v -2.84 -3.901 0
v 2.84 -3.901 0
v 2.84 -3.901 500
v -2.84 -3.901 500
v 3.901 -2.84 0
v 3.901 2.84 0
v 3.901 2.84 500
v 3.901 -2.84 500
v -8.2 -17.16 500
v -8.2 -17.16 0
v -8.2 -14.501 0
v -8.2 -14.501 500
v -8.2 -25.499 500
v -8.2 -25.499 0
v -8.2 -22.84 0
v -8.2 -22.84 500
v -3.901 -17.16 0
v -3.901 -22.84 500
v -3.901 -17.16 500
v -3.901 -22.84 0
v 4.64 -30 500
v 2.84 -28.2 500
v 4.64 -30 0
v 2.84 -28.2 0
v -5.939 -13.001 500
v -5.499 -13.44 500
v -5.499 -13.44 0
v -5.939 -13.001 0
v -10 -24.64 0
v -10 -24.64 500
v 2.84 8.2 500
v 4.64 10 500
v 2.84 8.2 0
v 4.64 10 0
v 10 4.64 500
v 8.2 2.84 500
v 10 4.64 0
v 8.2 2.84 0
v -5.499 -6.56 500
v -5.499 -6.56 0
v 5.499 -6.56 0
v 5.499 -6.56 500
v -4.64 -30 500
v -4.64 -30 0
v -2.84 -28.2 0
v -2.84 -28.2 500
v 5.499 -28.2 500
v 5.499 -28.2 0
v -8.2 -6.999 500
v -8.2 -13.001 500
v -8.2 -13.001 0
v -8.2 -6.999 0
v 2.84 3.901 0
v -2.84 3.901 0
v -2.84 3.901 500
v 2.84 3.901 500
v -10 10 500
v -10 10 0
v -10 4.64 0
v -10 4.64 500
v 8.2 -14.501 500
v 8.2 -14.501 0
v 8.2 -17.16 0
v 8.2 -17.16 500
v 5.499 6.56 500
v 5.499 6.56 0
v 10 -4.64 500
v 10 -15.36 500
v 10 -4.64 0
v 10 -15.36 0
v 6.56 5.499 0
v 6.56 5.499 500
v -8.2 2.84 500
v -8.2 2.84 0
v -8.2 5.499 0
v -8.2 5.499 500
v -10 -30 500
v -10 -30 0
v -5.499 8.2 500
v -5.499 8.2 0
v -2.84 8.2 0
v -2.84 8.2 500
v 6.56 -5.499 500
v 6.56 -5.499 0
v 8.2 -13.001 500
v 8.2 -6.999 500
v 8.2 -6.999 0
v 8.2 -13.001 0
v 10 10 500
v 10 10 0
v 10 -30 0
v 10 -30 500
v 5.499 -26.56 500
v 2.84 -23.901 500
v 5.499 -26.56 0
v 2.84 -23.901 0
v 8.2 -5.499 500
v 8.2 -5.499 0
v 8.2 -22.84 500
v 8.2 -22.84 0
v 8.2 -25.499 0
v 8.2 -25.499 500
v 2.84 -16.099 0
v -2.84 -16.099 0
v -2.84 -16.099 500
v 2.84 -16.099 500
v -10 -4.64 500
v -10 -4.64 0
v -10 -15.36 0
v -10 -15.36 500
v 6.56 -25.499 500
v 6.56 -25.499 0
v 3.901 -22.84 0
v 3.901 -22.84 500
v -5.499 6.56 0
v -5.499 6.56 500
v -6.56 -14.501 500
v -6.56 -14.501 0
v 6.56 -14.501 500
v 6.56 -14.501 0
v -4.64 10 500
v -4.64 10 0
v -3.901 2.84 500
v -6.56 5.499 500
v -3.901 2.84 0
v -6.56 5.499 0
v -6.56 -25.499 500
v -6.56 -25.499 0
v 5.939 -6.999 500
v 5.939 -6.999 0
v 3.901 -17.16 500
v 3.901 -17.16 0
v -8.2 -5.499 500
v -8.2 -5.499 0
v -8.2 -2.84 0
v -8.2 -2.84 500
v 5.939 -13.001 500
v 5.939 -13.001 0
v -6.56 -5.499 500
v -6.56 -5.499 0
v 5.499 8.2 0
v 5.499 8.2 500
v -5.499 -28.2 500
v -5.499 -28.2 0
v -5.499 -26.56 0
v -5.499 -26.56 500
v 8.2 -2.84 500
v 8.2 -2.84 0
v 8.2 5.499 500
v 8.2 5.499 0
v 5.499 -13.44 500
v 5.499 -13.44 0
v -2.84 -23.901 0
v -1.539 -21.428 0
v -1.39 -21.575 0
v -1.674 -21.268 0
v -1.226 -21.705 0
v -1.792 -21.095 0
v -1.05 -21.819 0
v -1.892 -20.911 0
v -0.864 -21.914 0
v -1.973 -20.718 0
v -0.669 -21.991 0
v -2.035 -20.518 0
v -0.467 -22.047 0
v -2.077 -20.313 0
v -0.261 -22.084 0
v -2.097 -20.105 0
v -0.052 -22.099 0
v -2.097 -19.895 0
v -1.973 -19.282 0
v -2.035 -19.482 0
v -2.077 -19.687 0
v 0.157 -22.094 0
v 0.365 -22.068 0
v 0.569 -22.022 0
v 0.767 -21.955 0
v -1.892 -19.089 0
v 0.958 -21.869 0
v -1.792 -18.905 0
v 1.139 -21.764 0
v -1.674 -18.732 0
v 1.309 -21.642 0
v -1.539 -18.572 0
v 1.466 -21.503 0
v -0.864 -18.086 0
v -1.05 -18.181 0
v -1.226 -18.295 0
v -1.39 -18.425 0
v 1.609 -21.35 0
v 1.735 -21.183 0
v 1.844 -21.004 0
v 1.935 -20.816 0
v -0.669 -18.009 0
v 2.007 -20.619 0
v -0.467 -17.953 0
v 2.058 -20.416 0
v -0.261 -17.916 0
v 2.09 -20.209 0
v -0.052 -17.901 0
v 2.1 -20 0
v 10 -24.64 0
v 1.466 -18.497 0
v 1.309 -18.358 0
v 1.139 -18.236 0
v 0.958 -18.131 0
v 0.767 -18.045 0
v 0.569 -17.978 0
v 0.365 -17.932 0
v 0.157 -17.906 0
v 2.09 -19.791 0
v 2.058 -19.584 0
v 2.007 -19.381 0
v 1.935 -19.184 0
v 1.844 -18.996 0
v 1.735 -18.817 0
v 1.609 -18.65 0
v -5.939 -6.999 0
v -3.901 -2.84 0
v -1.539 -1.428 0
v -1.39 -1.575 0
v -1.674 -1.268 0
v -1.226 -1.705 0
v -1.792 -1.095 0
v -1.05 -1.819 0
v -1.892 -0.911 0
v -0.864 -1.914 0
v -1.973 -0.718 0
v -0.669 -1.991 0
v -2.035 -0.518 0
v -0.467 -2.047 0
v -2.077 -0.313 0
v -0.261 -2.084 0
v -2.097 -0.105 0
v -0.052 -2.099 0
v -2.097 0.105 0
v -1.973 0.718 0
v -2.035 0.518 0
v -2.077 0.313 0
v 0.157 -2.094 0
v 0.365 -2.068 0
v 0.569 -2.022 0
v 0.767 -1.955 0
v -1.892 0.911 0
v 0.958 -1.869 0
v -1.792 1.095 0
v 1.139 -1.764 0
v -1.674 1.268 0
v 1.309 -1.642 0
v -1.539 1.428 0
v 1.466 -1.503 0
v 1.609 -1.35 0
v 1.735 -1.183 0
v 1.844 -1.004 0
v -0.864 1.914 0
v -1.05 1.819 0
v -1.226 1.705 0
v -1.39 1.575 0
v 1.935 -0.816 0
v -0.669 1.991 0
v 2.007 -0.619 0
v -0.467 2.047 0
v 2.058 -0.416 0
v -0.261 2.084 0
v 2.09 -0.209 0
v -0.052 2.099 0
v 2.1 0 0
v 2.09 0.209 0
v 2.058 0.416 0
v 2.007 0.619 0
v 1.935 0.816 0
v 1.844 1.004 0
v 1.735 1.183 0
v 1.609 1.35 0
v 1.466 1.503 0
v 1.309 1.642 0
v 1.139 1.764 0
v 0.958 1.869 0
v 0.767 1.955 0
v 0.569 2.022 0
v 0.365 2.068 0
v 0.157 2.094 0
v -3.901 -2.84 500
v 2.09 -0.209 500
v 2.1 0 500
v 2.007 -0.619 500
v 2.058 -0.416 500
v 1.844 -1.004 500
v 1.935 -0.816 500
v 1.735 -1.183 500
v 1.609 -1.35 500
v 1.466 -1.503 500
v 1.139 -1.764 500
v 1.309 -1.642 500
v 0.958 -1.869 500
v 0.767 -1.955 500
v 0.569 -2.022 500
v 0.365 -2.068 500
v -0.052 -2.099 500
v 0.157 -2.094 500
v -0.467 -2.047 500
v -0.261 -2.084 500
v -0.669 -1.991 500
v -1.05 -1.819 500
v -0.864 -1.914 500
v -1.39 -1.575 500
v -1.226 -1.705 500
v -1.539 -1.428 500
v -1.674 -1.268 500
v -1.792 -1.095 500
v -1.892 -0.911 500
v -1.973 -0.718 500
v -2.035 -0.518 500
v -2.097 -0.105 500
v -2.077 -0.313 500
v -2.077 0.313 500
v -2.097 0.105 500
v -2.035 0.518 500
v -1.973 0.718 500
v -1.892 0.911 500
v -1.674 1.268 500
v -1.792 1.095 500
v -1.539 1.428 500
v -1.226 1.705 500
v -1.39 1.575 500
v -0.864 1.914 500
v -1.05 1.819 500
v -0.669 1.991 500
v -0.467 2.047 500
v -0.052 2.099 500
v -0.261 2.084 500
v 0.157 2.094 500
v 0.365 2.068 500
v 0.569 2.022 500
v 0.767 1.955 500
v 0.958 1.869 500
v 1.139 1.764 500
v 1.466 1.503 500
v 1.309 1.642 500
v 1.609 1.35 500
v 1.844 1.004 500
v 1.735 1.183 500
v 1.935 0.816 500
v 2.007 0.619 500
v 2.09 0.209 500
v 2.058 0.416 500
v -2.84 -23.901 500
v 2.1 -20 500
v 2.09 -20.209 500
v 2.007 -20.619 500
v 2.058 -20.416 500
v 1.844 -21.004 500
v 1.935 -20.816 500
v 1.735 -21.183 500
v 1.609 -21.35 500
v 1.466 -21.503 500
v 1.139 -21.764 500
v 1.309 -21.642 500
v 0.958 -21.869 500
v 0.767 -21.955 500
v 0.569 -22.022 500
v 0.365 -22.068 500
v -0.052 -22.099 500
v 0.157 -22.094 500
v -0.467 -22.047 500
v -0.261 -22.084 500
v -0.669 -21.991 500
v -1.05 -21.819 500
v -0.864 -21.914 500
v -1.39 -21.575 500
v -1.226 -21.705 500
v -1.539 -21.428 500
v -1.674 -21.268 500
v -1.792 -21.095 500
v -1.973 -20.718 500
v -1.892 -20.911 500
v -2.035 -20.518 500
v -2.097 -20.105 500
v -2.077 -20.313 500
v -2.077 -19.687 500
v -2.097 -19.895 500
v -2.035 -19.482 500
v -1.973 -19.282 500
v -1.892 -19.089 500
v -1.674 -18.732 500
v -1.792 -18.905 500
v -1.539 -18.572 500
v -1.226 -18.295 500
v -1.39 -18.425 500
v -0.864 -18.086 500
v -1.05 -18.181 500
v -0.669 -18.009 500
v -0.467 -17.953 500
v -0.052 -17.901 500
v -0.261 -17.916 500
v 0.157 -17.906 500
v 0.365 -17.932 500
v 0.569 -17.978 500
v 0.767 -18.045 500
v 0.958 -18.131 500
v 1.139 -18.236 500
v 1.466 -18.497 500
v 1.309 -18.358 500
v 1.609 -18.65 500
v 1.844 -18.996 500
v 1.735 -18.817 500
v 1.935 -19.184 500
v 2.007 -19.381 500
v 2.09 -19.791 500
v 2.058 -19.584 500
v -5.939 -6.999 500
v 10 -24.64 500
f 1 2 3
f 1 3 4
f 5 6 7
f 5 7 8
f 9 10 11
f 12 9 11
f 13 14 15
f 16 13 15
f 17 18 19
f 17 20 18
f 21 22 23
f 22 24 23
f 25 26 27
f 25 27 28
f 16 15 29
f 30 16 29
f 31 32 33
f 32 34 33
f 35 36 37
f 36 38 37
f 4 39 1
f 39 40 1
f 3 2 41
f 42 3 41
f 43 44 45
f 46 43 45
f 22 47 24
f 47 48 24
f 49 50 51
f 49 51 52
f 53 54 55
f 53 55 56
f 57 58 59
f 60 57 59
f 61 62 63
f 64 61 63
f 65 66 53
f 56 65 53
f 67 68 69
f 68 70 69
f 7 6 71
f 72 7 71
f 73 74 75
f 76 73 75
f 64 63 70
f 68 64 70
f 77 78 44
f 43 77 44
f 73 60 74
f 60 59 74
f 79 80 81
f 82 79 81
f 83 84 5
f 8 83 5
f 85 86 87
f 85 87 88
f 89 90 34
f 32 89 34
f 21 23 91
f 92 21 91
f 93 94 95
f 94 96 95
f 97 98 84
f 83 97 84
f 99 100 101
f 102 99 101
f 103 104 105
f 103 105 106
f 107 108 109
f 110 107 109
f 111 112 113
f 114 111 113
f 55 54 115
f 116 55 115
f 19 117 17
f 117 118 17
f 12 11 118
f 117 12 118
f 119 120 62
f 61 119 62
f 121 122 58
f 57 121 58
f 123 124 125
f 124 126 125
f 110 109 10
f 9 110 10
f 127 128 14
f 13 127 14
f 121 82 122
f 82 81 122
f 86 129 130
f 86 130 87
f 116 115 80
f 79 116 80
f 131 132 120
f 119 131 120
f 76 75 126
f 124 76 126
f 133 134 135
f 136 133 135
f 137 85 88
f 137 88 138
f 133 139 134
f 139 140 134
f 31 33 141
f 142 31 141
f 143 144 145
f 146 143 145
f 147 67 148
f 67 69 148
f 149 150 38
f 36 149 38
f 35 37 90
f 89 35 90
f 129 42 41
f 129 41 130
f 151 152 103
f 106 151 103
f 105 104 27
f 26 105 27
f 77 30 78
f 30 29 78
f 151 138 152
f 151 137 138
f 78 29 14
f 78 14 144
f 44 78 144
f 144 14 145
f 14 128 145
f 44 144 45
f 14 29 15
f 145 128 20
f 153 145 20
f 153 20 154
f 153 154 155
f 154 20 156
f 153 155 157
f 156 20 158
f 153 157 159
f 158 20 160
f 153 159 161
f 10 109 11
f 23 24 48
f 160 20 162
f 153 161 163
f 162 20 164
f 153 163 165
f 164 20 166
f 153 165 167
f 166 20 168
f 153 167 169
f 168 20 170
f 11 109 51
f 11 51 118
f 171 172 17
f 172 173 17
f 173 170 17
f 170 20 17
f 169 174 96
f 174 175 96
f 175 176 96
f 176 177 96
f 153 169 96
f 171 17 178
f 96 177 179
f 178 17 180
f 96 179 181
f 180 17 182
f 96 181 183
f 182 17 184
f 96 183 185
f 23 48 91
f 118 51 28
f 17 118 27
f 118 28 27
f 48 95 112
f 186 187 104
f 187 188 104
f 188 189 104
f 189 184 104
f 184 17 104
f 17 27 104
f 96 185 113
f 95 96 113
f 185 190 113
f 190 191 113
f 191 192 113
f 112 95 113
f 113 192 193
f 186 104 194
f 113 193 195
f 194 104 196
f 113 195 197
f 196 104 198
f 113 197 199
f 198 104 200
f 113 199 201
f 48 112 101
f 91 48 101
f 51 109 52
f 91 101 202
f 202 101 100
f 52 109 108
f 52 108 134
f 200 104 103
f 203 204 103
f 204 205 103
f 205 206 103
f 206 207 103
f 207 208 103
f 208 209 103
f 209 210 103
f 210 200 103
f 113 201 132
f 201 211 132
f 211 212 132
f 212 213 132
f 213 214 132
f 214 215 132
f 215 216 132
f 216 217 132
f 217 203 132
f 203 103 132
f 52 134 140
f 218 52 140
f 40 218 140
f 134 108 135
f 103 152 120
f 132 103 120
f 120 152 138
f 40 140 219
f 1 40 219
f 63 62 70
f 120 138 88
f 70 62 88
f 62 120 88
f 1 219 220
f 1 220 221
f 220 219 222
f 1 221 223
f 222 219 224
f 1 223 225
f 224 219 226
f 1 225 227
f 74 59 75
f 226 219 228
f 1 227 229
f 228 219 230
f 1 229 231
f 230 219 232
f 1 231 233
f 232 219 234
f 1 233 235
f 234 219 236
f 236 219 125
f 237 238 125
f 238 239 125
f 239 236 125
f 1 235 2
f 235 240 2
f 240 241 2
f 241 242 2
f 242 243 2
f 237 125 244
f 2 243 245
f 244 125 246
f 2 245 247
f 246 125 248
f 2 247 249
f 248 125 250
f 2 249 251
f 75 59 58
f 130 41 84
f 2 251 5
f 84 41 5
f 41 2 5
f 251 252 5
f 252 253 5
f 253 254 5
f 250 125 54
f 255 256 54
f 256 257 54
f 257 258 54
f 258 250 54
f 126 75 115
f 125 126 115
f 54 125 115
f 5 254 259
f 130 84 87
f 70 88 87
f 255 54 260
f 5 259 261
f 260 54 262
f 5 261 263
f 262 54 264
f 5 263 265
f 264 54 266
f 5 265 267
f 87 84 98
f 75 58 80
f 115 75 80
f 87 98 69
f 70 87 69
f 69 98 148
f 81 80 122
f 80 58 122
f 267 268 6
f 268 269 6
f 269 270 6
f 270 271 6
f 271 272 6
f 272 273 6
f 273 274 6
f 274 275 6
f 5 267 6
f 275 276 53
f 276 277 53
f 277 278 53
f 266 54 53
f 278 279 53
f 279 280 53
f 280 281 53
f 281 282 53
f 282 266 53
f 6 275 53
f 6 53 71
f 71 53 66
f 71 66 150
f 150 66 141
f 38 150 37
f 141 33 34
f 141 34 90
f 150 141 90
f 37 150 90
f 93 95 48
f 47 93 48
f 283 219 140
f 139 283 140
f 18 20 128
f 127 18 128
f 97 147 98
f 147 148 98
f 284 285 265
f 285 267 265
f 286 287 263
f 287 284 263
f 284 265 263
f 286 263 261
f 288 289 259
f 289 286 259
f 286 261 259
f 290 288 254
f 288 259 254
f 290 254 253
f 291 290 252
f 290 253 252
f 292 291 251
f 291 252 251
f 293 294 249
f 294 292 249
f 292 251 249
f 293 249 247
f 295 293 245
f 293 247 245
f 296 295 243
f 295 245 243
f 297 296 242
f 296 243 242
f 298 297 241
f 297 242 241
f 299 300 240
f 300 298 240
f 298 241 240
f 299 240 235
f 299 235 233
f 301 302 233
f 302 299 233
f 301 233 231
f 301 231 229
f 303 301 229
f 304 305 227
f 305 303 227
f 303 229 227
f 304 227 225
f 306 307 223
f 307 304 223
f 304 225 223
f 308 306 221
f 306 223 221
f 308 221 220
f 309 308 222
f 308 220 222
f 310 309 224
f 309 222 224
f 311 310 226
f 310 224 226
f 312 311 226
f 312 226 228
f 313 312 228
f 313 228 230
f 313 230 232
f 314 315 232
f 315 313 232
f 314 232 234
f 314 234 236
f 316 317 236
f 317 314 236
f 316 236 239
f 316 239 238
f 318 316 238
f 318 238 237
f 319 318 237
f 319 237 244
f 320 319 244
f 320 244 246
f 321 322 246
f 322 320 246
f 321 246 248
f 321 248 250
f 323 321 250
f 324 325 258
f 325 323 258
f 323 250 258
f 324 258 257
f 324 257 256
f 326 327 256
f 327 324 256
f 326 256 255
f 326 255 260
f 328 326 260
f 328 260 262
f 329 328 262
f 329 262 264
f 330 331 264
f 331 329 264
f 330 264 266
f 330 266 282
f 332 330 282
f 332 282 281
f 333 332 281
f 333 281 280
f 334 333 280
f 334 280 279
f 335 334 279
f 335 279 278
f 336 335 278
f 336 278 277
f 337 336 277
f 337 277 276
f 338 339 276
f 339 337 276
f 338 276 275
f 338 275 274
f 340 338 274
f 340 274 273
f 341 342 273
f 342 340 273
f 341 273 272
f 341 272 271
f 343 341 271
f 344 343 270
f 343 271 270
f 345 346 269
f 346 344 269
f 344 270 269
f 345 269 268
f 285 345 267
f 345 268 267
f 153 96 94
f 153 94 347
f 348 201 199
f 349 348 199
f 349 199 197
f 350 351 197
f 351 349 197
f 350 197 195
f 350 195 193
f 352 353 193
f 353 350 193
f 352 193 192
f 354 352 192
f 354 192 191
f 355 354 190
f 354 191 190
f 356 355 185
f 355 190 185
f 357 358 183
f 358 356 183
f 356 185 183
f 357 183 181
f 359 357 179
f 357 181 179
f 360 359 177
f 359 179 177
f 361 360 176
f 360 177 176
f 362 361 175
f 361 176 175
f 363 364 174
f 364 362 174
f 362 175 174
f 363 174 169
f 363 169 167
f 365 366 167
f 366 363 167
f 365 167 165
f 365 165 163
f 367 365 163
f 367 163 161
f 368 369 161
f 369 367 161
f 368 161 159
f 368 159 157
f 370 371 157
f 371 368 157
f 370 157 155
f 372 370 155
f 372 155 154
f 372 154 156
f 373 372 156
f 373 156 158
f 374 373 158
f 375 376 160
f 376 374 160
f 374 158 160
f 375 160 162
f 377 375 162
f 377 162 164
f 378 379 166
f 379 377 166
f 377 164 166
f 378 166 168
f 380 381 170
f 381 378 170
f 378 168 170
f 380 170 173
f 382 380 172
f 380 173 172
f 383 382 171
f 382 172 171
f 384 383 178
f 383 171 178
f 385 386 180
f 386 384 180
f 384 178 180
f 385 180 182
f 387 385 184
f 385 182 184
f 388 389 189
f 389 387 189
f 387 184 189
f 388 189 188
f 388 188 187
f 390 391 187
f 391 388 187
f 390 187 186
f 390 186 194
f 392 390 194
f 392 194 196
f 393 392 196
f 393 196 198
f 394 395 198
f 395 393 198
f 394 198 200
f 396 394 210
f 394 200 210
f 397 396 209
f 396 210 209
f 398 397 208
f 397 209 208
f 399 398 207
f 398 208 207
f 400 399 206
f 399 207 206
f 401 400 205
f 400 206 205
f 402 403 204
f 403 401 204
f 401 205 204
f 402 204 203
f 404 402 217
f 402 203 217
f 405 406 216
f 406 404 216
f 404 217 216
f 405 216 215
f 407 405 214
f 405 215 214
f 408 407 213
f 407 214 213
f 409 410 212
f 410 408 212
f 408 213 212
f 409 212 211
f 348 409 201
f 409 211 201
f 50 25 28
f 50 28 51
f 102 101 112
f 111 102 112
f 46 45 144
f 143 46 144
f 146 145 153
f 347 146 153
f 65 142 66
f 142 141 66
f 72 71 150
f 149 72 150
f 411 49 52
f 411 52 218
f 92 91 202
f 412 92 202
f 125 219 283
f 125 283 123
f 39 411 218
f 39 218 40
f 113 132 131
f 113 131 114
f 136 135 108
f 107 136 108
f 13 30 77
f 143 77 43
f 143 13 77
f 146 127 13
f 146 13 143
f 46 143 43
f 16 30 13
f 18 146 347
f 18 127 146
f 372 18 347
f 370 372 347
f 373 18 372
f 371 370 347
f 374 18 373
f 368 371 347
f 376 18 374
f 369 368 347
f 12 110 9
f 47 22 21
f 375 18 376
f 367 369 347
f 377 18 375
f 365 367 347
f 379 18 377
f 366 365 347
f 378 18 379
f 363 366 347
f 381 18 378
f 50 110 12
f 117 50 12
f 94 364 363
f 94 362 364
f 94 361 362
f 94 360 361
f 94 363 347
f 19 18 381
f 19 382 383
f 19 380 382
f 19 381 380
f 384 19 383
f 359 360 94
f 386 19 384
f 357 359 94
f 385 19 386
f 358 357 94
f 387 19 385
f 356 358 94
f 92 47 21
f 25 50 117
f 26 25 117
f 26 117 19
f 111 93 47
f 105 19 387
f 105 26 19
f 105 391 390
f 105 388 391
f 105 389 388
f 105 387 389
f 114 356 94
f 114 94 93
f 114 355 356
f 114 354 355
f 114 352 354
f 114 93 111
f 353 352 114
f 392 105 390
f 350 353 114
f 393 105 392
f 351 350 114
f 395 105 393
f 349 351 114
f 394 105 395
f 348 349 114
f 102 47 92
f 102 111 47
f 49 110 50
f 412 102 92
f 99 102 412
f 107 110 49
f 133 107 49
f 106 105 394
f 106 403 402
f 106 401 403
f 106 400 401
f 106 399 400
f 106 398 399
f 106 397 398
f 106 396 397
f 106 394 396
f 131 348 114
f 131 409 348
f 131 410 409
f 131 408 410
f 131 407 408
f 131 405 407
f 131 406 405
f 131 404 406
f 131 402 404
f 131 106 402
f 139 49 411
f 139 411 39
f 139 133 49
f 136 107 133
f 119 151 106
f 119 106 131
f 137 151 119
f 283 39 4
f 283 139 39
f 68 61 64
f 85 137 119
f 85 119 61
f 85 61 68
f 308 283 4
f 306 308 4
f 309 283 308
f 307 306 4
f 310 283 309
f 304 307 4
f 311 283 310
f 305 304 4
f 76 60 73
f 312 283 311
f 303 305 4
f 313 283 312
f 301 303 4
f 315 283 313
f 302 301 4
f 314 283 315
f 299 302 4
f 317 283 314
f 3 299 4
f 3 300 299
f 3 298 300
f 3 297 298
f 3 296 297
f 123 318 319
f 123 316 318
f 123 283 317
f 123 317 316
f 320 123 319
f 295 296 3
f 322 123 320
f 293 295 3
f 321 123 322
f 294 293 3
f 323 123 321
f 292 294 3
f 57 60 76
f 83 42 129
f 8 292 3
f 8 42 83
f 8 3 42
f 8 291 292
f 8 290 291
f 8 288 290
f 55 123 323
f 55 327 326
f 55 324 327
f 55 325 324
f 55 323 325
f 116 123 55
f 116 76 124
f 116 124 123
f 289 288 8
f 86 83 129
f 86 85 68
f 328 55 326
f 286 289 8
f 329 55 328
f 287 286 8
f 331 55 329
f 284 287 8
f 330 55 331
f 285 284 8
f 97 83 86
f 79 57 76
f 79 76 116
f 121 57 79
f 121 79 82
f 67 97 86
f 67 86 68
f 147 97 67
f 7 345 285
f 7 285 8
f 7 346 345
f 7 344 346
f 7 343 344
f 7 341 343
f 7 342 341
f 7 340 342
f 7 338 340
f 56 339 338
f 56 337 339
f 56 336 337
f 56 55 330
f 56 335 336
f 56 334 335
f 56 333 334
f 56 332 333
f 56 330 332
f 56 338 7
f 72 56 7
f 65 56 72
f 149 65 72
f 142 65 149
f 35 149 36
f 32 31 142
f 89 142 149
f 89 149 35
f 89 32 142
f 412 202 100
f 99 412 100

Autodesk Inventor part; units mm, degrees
ref_plane "YZ Plane" through (0, 0, 0) normal (1, 0, 0) x (0, 1, 0)
ref_plane "XZ Plane" through (0, 0, 0) normal (0, 1, 0) x (-1, 0, 0)
ref_plane "XY Plane" through (0, 0, 0) normal (0, 0, 1) x (1, 0, 0)
sketch "Sketch1" plane through (0, 0, 0) normal (0, 0, 1) x (1, 0, 0)
  line L0 (-3.9007, 3.9007) -> (3.9007, 3.9007)
  line L1 (3.9007, 3.9007) -> (3.9007, -3.9007)
  line L2 (3.9007, -3.9007) -> (-3.9007, -3.9007)
  line L3 (-3.9007, -3.9007) -> (-3.9007, 3.9007)
  line L4 (0, 3.9007) -> (0, -3.9007) construction
  line L5 (-3.9007, 0) -> (3.9007, 0) construction
  circle A0 centre (0, 0) radius 2.1
  line L6 (0, 0) -> (-16.1173, 16.1173) construction
  line L7 (0, 0) -> (22.7933, 0) construction
  line L8 (-2.84, 3.9007) -> (-5.4993, 6.56)
  line L9 (-5.4993, 6.56) -> (-5.4993, 8.2)
  line L10 (-5.4993, 8.2) -> (-2.84, 8.2)
  line L11 (-2.84, 8.2) -> (-4.64, 10)
  line L12 (-4.64, 10) -> (-10, 10)
  line L13 (-10, 10) -> (-10, 4.64)
  line L14 (-10, 4.64) -> (-8.2, 2.84)
  line L15 (-8.2, 2.84) -> (-8.2, 5.4993)
  line L16 (-8.2, 5.4993) -> (-6.56, 5.4993)
  line L17 (-6.56, 5.4993) -> (-3.9007, 2.84)
  line L18 (-3.9007, 2.84) -> (-11.3102, 2.84) construction
  line L19 (-2.84, 3.9007) -> (-3.9007, 3.9007)
  line L20 (-3.9007, 2.84) -> (-3.9007, 3.9007)
  line L21 (-3.9007, -2.84) -> (-6.56, -5.4993)
  line L22 (-6.56, -5.4993) -> (-8.2, -5.4993)
  line L23 (-8.2, -5.4993) -> (-8.2, -2.84)
  line L24 (-8.2, -2.84) -> (-10, -4.64)
  line L25 (-10, -4.64) -> (-10, -10)
  line L26 (-10, -10) -> (-4.64, -10)
  line L27 (-4.64, -10) -> (-2.84, -8.2)
  line L28 (-2.84, -8.2) -> (-5.4993, -8.2)
  line L29 (-5.4993, -8.2) -> (-5.4993, -6.56)
  line L30 (-5.4993, -6.56) -> (-2.84, -3.9007)
  line L31 (-3.9007, -2.84) -> (-3.9007, -3.9007)
  line L32 (-2.84, -3.9007) -> (-3.9007, -3.9007)
  line L33 (2.84, -3.9007) -> (5.4993, -6.56)
  line L34 (5.4993, -6.56) -> (5.4993, -8.2)
  line L35 (5.4993, -8.2) -> (2.84, -8.2)
  line L36 (2.84, -8.2) -> (4.64, -10)
  line L37 (4.64, -10) -> (10, -10)
  line L38 (10, -10) -> (10, -4.64)
  line L39 (10, -4.64) -> (8.2, -2.84)
  line L40 (8.2, -2.84) -> (8.2, -5.4993)
  line L41 (8.2, -5.4993) -> (6.56, -5.4993)
  line L42 (6.56, -5.4993) -> (3.9007, -2.84)
  line L43 (2.84, -3.9007) -> (3.9007, -3.9007)
  line L44 (3.9007, -2.84) -> (3.9007, -3.9007)
  line L45 (3.9007, 2.84) -> (6.56, 5.4993)
  line L46 (6.56, 5.4993) -> (8.2, 5.4993)
  line L47 (8.2, 5.4993) -> (8.2, 2.84)
  line L48 (8.2, 2.84) -> (10, 4.64)
  line L49 (10, 4.64) -> (10, 10)
  line L50 (10, 10) -> (4.64, 10)
  line L51 (4.64, 10) -> (2.84, 8.2)
  line L52 (2.84, 8.2) -> (5.4993, 8.2)
  line L53 (5.4993, 8.2) -> (5.4993, 6.56)
  line L54 (5.4993, 6.56) -> (2.84, 3.9007)
  line L55 (3.9007, 2.84) -> (3.9007, 3.9007)
  line L56 (2.84, 3.9007) -> (3.9007, 3.9007)
  dimension "d7" = 4.2
  dimension "d8" = 135
  dimension "d9" = 1.5
  dimension "d10" = 1.64
  dimension "d11" = 1.8
  dimension "d12" = 2.84
  dimension "d13" = 10
  dimension "d16" = 360
extrude "Extrusion1" add sketch "Sketch1" along normal blind 500
pattern_linear "Rectangular Pattern1" count 2 spacing 20 along (0, -1, 0) of "Extrusion1"
sketch "Sketch2" plane through (0, 0, 500) normal (0, 0, 1) x (1, 0, 0)
  line L0 (8.2, -2.84) -> (8.2, -5.4993) projected
  line L1 (8.2, -5.4993) -> (6.56, -5.4993) projected
  line L2 (-6.56, -5.4993) -> (-8.2, -5.4993) projected
  line L3 (-8.2, -5.4993) -> (-8.2, -2.84) projected
  line L4 (-8.2, -14.5007) -> (-6.56, -14.5007) projected
  line L5 (6.56, -14.5007) -> (8.2, -14.5007) projected
  line L6 (5.4993, -11.8) -> (5.4993, -13.44) projected
  line L7 (5.4993, -13.44) -> (2.84, -16.0993) projected
  line L8 (-2.84, -16.0993) -> (-5.4993, -13.44) projected
  line L9 (-5.4993, -8.2) -> (-5.4993, -6.56) projected
  line L10 (-5.4993, -6.56) -> (-2.84, -3.9007) projected
  line L11 (2.84, -3.9007) -> (5.4993, -6.56) projected
  line L12 (2.84, -8.2) -> (4.64, -10) projected
  line L13 (-8.2, -6.9993) -> (-5.9387, -6.9993)
  line L14 (-5.9387, -6.9993) -> (-4.1231, -5.1837)
  line L15 (-4.1231, -5.1837) -> (4.1231, -5.1837)
  line L16 (4.1231, -5.1837) -> (5.9387, -6.9993)
  line L17 (5.9387, -6.9993) -> (8.2, -6.9993)
  line L18 (8.2, -6.9993) -> (8.2, -13.0007)
  line L19 (8.2, -13.0007) -> (5.9387, -13.0007)
  line L20 (5.9387, -13.0007) -> (4.2461, -14.6932)
  line L21 (4.2461, -14.6932) -> (-4.2461, -14.6932)
  line L22 (-4.2461, -14.6932) -> (-5.9387, -13.0007)
  line L23 (-5.9387, -13.0007) -> (-8.2, -13.0007)
  line L24 (-8.2, -13.0007) -> (-8.2, -6.9993)
  dimension "d23" = 1.5
  dimension "d24" = 1.5
  dimension "d25" = 1.5
  dimension "d26" = 1.5
extrude "Extrusion2" cut sketch "Sketch2" against normal up to next
equation "\"d24\" = d23"
equation "\"d25\" = d23"
equation "\"d26\" = d23"
properties part number "20x40x500mm"
